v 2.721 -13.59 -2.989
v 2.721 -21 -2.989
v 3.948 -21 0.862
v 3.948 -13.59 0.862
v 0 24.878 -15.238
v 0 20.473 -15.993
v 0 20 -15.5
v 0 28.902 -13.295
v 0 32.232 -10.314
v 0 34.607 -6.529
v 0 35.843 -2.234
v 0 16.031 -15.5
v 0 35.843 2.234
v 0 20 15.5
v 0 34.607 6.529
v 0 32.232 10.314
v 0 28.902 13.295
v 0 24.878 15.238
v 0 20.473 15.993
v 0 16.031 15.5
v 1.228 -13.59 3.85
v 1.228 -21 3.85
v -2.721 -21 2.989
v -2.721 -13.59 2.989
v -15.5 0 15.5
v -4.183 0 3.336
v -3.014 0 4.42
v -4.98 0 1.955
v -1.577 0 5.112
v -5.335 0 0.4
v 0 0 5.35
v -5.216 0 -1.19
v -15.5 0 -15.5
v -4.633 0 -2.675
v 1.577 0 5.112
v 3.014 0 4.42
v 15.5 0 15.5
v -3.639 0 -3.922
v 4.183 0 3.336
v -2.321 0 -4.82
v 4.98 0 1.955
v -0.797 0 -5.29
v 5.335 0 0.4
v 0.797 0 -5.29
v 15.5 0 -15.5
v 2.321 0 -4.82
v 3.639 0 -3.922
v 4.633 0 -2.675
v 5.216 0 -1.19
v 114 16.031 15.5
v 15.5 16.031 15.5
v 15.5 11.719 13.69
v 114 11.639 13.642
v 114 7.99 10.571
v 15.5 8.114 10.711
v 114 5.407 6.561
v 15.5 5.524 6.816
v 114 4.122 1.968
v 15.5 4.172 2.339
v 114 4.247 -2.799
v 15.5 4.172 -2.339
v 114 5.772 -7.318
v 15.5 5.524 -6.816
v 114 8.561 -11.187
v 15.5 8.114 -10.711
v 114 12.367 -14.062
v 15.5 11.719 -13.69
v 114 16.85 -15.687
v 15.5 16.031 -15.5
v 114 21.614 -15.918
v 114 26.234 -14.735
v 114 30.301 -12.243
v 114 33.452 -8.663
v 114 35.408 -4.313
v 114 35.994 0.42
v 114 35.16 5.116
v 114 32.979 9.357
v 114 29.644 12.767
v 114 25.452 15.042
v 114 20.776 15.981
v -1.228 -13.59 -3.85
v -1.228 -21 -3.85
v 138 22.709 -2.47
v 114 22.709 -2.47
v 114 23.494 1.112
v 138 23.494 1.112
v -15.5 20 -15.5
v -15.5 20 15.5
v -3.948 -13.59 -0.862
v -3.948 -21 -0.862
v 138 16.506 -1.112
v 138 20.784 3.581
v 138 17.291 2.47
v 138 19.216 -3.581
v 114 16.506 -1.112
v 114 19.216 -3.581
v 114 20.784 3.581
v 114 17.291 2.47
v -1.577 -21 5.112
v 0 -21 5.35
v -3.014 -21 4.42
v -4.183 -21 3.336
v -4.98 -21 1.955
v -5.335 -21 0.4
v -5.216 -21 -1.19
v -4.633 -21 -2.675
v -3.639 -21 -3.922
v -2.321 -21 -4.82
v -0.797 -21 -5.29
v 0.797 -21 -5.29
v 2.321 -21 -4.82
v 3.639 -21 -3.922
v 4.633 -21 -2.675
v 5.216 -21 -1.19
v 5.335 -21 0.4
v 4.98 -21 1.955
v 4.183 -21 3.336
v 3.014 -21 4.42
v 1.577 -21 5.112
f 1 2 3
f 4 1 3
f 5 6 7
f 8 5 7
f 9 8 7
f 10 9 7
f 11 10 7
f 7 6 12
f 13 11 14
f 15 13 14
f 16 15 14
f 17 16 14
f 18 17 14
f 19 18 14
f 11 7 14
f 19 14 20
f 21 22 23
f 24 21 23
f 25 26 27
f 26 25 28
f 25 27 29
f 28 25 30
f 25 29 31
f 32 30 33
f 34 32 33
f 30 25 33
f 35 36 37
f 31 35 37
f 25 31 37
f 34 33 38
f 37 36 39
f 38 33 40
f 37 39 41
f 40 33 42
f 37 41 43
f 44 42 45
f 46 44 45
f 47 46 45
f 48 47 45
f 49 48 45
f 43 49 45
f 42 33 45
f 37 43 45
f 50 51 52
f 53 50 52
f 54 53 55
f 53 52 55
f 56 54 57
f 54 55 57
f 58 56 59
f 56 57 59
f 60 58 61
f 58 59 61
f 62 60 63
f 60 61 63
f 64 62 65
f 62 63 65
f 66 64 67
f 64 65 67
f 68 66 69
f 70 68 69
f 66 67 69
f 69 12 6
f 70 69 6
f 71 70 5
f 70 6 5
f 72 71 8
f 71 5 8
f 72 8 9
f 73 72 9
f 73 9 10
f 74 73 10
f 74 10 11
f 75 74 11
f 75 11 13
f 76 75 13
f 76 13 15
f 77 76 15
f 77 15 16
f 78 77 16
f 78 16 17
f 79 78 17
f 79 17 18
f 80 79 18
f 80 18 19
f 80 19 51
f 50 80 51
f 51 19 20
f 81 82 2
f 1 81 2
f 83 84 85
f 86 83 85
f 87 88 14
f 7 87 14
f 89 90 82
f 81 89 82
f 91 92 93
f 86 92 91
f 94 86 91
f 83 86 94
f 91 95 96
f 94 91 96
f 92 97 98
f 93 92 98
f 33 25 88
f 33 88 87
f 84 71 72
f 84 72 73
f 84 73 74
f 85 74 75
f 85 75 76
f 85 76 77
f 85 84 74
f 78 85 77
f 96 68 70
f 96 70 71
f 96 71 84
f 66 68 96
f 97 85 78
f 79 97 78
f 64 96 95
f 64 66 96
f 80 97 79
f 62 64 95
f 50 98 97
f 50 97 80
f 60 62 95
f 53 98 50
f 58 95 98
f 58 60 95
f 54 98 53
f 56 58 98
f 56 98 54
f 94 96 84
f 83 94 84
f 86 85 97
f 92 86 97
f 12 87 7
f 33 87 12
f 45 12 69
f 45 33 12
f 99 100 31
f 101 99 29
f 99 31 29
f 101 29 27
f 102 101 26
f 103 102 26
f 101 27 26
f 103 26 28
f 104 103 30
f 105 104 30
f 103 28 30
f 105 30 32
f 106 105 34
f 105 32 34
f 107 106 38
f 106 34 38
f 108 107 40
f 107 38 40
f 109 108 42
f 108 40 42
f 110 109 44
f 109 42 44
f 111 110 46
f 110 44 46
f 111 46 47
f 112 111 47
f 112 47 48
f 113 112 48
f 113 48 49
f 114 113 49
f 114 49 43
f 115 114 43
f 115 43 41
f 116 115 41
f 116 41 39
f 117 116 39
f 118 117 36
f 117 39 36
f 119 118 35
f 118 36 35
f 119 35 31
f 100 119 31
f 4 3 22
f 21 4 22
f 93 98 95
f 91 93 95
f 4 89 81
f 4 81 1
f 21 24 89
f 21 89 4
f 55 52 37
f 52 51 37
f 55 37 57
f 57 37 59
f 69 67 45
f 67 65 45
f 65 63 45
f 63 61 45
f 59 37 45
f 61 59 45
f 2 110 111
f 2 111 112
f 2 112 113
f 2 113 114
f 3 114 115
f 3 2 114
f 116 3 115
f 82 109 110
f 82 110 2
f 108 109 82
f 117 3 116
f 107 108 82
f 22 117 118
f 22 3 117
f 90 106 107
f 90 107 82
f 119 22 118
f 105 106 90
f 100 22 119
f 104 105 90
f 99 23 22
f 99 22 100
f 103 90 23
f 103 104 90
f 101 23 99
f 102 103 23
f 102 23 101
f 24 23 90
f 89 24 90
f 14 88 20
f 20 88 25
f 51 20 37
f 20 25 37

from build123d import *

# Parameters (mm, degrees)
SKETCH1_W           = 31
SKETCH1_H           = 31
BOSS_EXTRUDE1_DEPTH = 20
SKETCH2_R           = 16
BOSS_EXTRUDE2_DEPTH = 114
BOSS_EXTRUDE3_DEPTH = 24
SKETCH4_R           = 5.35
BOSS_EXTRUDE4_DEPTH = 21
CUT_EXTRUDE1_DEPTH  = 7.41


with BuildPart() as part:
    # Sketch1 → Boss-Extrude1 (new body)
    with BuildSketch(Plane(origin=(0, 0, 0), x_dir=(1, 0, 0), z_dir=(0, 1, 0))):
        Rectangle(SKETCH1_W, SKETCH1_H)
    extrude(amount=BOSS_EXTRUDE1_DEPTH)

    # Sketch2 → Boss-Extrude2 (add)
    with BuildSketch(Plane(origin=(0, 0, 0), x_dir=(0, 0, -1), z_dir=(1, 0, 0))):
        with Locations(Location((0, 20, 0), (0, 0, 194.361511563))):
            Circle(SKETCH2_R)
    extrude(amount=BOSS_EXTRUDE2_DEPTH)

    # Sketch3 → Boss-Extrude3 (add)
    with BuildSketch(Plane(origin=(114, 0, 0), x_dir=(0, 0, -1), z_dir=(1, 0, 0))):
        Polygon((2.469779477, 22.709432167), (-1.111547348, 23.493607852), (-3.581326825, 20.784175685), (-2.469779477, 17.290567833), (1.111547348, 16.506392148), (3.581326825, 19.215824315), align=None)
    extrude(amount=BOSS_EXTRUDE3_DEPTH)

    # Sketch4 → Boss-Extrude4 (add)
    with BuildSketch(Plane.XZ):
        with Locations(Location((0, 0, 0), (0, 0, 90))):
            Circle(SKETCH4_R)
    extrude(amount=BOSS_EXTRUDE4_DEPTH)

    # Sketch5 → Cut-Extrude1 (cut)
    with BuildSketch(Plane.XZ.offset(21)):
        Polygon((-3.948474252, -0.861907427), (-1.227803399, -3.850432722), (2.720670854, -2.988525295), (3.948474252, 0.861907427), (1.227803399, 3.850432722), (-2.720670854, 2.988525295), align=None)
    extrude(amount=-CUT_EXTRUDE1_DEPTH, mode=Mode.SUBTRACT)


solid = part.part
